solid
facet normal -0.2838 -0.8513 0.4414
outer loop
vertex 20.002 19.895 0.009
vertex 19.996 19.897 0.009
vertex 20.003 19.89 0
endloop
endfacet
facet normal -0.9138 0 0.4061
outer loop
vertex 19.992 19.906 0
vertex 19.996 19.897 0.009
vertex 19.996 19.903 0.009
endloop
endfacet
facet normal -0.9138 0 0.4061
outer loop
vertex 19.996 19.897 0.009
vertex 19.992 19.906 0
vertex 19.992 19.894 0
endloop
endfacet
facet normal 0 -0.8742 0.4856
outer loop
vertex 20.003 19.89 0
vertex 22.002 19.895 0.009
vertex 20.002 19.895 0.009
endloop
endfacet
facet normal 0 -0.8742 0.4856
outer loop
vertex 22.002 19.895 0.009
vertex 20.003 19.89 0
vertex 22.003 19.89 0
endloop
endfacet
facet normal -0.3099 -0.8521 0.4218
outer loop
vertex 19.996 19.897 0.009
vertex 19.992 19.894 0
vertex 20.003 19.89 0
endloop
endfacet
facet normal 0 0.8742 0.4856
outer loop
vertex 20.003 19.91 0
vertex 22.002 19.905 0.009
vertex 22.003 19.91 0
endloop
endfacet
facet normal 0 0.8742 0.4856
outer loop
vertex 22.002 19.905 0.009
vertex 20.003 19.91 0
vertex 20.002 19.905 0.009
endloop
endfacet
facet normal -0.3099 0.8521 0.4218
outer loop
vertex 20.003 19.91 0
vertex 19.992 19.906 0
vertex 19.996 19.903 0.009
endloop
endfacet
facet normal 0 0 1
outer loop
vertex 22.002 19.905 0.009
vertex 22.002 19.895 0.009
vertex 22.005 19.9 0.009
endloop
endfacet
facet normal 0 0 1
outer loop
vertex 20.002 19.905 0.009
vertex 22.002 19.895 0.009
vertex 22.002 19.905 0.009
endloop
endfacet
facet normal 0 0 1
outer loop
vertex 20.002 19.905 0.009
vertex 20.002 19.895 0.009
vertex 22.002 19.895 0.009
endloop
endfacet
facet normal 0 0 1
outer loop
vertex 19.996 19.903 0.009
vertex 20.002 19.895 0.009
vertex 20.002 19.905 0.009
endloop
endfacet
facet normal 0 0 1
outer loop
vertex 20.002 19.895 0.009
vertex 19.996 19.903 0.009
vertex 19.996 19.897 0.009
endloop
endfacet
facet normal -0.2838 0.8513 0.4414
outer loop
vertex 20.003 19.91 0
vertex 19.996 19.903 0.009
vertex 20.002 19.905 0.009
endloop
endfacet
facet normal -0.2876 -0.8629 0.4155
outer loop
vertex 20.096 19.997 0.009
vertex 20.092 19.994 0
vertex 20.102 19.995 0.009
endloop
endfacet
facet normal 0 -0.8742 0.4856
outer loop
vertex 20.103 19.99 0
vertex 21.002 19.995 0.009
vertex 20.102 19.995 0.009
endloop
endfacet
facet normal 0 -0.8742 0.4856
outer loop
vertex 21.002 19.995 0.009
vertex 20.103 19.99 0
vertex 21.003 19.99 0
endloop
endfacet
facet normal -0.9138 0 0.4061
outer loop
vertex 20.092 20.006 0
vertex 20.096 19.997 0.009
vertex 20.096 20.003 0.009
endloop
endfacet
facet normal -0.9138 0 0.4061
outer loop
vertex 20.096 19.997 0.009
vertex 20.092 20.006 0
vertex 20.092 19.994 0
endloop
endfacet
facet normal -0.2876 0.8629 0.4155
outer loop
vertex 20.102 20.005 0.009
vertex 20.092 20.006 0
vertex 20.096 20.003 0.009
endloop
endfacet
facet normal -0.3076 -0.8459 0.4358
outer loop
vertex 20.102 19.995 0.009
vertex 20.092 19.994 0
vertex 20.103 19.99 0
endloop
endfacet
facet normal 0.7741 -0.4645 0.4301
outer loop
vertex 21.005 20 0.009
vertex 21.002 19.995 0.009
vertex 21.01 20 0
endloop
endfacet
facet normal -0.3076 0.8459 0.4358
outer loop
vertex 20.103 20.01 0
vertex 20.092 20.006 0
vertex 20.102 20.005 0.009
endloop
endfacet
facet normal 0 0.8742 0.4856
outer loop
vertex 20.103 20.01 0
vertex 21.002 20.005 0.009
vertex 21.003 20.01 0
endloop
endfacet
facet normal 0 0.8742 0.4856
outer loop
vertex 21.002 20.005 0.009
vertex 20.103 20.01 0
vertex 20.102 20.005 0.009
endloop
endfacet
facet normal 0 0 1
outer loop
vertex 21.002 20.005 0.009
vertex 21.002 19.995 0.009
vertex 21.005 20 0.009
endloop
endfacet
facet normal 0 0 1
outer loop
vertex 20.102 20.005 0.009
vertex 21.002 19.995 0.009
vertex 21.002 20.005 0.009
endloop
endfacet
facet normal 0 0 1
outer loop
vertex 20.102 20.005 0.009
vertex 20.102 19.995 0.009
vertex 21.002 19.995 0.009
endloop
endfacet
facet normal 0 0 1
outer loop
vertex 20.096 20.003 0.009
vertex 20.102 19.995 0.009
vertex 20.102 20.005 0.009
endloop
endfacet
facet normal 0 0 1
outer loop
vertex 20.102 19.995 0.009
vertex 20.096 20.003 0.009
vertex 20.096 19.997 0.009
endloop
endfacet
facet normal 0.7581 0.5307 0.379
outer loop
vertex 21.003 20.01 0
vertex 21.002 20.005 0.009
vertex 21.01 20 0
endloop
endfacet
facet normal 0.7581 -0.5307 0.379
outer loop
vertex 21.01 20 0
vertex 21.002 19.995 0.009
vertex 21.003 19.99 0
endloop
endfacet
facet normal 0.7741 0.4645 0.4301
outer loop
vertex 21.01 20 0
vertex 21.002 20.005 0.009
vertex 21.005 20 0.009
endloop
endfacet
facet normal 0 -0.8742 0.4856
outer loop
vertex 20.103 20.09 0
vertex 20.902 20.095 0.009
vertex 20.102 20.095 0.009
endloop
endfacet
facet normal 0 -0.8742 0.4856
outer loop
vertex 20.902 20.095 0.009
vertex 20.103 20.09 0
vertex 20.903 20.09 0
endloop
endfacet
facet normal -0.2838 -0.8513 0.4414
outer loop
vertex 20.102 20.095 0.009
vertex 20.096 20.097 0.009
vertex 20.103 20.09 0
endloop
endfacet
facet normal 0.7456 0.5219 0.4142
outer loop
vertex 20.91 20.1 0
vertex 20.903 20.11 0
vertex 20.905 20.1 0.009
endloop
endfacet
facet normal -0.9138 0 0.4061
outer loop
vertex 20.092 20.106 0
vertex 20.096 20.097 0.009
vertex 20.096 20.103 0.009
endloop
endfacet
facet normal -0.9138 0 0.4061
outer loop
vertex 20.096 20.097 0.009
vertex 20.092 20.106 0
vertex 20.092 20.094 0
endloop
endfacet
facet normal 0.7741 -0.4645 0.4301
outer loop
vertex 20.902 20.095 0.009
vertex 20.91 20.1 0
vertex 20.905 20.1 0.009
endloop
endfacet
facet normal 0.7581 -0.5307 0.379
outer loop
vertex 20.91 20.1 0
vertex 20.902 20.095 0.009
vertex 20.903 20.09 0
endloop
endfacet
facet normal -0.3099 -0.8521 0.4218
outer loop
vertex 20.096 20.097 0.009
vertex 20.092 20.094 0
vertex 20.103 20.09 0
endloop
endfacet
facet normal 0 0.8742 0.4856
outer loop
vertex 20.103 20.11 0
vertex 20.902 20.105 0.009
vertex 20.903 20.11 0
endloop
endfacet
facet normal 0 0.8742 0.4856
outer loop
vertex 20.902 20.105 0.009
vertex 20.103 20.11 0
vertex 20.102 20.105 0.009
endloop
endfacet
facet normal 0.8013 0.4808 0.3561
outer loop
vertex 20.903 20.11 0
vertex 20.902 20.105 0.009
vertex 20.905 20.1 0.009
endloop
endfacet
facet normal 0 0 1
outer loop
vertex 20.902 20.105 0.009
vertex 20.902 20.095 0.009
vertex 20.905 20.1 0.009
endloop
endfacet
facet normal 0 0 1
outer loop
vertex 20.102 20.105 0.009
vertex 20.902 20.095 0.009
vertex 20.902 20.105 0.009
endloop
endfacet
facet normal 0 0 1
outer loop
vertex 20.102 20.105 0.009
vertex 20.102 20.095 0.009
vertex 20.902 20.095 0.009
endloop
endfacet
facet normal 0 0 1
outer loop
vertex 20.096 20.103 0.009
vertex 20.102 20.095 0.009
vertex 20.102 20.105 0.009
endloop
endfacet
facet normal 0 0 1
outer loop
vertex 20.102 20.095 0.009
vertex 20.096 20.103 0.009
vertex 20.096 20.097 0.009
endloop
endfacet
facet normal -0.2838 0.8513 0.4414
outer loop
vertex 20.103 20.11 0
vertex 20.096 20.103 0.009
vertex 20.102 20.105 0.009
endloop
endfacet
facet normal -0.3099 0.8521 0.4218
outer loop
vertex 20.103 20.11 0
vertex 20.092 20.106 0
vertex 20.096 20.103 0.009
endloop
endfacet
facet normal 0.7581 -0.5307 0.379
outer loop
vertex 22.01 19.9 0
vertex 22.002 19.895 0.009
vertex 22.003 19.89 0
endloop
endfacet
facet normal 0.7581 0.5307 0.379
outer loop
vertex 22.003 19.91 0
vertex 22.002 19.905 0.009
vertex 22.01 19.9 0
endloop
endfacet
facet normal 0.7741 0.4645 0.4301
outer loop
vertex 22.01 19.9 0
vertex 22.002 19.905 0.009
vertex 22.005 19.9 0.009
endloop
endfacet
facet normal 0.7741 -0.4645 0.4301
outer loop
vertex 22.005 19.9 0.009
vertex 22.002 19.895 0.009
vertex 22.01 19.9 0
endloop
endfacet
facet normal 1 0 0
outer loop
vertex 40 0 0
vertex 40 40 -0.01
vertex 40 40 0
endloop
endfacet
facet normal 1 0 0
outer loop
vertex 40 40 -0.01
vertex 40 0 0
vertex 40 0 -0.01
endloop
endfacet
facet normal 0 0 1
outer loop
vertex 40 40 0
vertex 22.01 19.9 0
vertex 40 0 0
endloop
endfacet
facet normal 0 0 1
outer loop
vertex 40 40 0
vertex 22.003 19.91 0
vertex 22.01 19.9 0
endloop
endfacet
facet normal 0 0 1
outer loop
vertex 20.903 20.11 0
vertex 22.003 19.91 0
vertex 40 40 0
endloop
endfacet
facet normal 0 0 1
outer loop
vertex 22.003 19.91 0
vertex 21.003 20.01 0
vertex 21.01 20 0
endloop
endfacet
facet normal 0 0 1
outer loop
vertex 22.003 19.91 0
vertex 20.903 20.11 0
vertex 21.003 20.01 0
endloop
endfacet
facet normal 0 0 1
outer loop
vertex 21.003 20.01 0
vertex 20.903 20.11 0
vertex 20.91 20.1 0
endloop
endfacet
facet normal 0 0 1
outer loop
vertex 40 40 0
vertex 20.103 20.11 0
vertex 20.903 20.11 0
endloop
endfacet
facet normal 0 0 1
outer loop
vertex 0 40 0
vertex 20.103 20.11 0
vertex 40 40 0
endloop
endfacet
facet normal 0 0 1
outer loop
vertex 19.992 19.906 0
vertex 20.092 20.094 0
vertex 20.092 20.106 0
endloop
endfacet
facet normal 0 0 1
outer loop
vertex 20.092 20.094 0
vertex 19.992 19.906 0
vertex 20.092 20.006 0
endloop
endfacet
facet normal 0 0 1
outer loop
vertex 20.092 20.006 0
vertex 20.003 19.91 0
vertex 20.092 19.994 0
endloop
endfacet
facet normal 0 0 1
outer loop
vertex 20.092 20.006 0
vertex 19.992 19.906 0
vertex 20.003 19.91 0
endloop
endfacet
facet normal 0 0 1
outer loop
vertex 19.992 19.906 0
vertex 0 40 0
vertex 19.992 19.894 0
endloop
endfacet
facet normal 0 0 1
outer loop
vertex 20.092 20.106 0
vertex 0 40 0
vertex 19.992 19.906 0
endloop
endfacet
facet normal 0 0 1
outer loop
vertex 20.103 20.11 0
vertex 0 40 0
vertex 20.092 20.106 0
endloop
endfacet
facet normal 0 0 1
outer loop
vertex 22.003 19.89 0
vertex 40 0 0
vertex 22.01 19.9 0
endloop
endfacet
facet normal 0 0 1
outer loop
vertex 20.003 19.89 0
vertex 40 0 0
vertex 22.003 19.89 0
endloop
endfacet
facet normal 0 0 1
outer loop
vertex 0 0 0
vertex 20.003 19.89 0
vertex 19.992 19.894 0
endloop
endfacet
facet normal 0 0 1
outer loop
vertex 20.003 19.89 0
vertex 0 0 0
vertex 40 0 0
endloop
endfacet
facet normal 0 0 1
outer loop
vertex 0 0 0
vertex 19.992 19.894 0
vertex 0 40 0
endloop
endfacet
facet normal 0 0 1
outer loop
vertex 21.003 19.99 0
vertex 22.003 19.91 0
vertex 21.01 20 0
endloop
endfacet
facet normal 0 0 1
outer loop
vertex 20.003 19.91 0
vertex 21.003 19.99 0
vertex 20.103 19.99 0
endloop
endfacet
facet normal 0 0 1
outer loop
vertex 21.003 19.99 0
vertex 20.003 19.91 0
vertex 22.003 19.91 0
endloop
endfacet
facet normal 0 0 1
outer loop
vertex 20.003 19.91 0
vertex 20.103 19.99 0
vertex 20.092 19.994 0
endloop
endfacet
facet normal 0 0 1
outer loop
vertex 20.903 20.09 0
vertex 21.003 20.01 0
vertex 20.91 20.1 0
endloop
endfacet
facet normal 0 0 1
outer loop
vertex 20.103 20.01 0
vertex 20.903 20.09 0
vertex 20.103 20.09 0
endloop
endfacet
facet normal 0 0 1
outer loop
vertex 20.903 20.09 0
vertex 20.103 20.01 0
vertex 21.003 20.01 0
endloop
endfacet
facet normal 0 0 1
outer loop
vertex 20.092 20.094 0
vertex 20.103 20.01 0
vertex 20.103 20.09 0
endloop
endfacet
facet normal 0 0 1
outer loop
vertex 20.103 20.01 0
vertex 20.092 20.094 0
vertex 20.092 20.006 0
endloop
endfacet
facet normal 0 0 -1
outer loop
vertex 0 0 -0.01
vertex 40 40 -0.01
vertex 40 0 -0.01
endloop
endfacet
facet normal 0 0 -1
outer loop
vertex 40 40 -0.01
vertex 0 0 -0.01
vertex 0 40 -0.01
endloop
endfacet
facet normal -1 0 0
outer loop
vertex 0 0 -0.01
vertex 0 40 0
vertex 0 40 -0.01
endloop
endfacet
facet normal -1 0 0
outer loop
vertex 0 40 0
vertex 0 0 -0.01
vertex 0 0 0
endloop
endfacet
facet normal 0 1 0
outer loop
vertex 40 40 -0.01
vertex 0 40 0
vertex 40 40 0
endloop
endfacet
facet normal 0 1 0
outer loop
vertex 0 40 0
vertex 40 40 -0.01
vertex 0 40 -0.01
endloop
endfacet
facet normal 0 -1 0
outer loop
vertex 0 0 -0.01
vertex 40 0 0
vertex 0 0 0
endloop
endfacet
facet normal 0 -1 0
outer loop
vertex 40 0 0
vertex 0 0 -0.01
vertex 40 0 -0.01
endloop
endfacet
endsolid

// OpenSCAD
hull(){
    translate([20.0, 19.9]) sphere(0.01);
    translate([21.0, 19.9]) sphere(0.01);
}
hull(){
    translate([21.0, 20.0]) sphere(0.01);
    translate([20.1, 20.0]) sphere(0.01);
}
hull(){
    translate([20.1, 20.1]) sphere(0.01);
    translate([20.9, 20.1]) sphere(0.01);
}
hull(){
    translate([20.9, 19.9]) sphere(0.01);
    translate([22.0, 19.9]) sphere(0.01);
}
translate([0,0,-0.01]) color([0.1,0.1,0.1]) cube([40,40,0.01]);
